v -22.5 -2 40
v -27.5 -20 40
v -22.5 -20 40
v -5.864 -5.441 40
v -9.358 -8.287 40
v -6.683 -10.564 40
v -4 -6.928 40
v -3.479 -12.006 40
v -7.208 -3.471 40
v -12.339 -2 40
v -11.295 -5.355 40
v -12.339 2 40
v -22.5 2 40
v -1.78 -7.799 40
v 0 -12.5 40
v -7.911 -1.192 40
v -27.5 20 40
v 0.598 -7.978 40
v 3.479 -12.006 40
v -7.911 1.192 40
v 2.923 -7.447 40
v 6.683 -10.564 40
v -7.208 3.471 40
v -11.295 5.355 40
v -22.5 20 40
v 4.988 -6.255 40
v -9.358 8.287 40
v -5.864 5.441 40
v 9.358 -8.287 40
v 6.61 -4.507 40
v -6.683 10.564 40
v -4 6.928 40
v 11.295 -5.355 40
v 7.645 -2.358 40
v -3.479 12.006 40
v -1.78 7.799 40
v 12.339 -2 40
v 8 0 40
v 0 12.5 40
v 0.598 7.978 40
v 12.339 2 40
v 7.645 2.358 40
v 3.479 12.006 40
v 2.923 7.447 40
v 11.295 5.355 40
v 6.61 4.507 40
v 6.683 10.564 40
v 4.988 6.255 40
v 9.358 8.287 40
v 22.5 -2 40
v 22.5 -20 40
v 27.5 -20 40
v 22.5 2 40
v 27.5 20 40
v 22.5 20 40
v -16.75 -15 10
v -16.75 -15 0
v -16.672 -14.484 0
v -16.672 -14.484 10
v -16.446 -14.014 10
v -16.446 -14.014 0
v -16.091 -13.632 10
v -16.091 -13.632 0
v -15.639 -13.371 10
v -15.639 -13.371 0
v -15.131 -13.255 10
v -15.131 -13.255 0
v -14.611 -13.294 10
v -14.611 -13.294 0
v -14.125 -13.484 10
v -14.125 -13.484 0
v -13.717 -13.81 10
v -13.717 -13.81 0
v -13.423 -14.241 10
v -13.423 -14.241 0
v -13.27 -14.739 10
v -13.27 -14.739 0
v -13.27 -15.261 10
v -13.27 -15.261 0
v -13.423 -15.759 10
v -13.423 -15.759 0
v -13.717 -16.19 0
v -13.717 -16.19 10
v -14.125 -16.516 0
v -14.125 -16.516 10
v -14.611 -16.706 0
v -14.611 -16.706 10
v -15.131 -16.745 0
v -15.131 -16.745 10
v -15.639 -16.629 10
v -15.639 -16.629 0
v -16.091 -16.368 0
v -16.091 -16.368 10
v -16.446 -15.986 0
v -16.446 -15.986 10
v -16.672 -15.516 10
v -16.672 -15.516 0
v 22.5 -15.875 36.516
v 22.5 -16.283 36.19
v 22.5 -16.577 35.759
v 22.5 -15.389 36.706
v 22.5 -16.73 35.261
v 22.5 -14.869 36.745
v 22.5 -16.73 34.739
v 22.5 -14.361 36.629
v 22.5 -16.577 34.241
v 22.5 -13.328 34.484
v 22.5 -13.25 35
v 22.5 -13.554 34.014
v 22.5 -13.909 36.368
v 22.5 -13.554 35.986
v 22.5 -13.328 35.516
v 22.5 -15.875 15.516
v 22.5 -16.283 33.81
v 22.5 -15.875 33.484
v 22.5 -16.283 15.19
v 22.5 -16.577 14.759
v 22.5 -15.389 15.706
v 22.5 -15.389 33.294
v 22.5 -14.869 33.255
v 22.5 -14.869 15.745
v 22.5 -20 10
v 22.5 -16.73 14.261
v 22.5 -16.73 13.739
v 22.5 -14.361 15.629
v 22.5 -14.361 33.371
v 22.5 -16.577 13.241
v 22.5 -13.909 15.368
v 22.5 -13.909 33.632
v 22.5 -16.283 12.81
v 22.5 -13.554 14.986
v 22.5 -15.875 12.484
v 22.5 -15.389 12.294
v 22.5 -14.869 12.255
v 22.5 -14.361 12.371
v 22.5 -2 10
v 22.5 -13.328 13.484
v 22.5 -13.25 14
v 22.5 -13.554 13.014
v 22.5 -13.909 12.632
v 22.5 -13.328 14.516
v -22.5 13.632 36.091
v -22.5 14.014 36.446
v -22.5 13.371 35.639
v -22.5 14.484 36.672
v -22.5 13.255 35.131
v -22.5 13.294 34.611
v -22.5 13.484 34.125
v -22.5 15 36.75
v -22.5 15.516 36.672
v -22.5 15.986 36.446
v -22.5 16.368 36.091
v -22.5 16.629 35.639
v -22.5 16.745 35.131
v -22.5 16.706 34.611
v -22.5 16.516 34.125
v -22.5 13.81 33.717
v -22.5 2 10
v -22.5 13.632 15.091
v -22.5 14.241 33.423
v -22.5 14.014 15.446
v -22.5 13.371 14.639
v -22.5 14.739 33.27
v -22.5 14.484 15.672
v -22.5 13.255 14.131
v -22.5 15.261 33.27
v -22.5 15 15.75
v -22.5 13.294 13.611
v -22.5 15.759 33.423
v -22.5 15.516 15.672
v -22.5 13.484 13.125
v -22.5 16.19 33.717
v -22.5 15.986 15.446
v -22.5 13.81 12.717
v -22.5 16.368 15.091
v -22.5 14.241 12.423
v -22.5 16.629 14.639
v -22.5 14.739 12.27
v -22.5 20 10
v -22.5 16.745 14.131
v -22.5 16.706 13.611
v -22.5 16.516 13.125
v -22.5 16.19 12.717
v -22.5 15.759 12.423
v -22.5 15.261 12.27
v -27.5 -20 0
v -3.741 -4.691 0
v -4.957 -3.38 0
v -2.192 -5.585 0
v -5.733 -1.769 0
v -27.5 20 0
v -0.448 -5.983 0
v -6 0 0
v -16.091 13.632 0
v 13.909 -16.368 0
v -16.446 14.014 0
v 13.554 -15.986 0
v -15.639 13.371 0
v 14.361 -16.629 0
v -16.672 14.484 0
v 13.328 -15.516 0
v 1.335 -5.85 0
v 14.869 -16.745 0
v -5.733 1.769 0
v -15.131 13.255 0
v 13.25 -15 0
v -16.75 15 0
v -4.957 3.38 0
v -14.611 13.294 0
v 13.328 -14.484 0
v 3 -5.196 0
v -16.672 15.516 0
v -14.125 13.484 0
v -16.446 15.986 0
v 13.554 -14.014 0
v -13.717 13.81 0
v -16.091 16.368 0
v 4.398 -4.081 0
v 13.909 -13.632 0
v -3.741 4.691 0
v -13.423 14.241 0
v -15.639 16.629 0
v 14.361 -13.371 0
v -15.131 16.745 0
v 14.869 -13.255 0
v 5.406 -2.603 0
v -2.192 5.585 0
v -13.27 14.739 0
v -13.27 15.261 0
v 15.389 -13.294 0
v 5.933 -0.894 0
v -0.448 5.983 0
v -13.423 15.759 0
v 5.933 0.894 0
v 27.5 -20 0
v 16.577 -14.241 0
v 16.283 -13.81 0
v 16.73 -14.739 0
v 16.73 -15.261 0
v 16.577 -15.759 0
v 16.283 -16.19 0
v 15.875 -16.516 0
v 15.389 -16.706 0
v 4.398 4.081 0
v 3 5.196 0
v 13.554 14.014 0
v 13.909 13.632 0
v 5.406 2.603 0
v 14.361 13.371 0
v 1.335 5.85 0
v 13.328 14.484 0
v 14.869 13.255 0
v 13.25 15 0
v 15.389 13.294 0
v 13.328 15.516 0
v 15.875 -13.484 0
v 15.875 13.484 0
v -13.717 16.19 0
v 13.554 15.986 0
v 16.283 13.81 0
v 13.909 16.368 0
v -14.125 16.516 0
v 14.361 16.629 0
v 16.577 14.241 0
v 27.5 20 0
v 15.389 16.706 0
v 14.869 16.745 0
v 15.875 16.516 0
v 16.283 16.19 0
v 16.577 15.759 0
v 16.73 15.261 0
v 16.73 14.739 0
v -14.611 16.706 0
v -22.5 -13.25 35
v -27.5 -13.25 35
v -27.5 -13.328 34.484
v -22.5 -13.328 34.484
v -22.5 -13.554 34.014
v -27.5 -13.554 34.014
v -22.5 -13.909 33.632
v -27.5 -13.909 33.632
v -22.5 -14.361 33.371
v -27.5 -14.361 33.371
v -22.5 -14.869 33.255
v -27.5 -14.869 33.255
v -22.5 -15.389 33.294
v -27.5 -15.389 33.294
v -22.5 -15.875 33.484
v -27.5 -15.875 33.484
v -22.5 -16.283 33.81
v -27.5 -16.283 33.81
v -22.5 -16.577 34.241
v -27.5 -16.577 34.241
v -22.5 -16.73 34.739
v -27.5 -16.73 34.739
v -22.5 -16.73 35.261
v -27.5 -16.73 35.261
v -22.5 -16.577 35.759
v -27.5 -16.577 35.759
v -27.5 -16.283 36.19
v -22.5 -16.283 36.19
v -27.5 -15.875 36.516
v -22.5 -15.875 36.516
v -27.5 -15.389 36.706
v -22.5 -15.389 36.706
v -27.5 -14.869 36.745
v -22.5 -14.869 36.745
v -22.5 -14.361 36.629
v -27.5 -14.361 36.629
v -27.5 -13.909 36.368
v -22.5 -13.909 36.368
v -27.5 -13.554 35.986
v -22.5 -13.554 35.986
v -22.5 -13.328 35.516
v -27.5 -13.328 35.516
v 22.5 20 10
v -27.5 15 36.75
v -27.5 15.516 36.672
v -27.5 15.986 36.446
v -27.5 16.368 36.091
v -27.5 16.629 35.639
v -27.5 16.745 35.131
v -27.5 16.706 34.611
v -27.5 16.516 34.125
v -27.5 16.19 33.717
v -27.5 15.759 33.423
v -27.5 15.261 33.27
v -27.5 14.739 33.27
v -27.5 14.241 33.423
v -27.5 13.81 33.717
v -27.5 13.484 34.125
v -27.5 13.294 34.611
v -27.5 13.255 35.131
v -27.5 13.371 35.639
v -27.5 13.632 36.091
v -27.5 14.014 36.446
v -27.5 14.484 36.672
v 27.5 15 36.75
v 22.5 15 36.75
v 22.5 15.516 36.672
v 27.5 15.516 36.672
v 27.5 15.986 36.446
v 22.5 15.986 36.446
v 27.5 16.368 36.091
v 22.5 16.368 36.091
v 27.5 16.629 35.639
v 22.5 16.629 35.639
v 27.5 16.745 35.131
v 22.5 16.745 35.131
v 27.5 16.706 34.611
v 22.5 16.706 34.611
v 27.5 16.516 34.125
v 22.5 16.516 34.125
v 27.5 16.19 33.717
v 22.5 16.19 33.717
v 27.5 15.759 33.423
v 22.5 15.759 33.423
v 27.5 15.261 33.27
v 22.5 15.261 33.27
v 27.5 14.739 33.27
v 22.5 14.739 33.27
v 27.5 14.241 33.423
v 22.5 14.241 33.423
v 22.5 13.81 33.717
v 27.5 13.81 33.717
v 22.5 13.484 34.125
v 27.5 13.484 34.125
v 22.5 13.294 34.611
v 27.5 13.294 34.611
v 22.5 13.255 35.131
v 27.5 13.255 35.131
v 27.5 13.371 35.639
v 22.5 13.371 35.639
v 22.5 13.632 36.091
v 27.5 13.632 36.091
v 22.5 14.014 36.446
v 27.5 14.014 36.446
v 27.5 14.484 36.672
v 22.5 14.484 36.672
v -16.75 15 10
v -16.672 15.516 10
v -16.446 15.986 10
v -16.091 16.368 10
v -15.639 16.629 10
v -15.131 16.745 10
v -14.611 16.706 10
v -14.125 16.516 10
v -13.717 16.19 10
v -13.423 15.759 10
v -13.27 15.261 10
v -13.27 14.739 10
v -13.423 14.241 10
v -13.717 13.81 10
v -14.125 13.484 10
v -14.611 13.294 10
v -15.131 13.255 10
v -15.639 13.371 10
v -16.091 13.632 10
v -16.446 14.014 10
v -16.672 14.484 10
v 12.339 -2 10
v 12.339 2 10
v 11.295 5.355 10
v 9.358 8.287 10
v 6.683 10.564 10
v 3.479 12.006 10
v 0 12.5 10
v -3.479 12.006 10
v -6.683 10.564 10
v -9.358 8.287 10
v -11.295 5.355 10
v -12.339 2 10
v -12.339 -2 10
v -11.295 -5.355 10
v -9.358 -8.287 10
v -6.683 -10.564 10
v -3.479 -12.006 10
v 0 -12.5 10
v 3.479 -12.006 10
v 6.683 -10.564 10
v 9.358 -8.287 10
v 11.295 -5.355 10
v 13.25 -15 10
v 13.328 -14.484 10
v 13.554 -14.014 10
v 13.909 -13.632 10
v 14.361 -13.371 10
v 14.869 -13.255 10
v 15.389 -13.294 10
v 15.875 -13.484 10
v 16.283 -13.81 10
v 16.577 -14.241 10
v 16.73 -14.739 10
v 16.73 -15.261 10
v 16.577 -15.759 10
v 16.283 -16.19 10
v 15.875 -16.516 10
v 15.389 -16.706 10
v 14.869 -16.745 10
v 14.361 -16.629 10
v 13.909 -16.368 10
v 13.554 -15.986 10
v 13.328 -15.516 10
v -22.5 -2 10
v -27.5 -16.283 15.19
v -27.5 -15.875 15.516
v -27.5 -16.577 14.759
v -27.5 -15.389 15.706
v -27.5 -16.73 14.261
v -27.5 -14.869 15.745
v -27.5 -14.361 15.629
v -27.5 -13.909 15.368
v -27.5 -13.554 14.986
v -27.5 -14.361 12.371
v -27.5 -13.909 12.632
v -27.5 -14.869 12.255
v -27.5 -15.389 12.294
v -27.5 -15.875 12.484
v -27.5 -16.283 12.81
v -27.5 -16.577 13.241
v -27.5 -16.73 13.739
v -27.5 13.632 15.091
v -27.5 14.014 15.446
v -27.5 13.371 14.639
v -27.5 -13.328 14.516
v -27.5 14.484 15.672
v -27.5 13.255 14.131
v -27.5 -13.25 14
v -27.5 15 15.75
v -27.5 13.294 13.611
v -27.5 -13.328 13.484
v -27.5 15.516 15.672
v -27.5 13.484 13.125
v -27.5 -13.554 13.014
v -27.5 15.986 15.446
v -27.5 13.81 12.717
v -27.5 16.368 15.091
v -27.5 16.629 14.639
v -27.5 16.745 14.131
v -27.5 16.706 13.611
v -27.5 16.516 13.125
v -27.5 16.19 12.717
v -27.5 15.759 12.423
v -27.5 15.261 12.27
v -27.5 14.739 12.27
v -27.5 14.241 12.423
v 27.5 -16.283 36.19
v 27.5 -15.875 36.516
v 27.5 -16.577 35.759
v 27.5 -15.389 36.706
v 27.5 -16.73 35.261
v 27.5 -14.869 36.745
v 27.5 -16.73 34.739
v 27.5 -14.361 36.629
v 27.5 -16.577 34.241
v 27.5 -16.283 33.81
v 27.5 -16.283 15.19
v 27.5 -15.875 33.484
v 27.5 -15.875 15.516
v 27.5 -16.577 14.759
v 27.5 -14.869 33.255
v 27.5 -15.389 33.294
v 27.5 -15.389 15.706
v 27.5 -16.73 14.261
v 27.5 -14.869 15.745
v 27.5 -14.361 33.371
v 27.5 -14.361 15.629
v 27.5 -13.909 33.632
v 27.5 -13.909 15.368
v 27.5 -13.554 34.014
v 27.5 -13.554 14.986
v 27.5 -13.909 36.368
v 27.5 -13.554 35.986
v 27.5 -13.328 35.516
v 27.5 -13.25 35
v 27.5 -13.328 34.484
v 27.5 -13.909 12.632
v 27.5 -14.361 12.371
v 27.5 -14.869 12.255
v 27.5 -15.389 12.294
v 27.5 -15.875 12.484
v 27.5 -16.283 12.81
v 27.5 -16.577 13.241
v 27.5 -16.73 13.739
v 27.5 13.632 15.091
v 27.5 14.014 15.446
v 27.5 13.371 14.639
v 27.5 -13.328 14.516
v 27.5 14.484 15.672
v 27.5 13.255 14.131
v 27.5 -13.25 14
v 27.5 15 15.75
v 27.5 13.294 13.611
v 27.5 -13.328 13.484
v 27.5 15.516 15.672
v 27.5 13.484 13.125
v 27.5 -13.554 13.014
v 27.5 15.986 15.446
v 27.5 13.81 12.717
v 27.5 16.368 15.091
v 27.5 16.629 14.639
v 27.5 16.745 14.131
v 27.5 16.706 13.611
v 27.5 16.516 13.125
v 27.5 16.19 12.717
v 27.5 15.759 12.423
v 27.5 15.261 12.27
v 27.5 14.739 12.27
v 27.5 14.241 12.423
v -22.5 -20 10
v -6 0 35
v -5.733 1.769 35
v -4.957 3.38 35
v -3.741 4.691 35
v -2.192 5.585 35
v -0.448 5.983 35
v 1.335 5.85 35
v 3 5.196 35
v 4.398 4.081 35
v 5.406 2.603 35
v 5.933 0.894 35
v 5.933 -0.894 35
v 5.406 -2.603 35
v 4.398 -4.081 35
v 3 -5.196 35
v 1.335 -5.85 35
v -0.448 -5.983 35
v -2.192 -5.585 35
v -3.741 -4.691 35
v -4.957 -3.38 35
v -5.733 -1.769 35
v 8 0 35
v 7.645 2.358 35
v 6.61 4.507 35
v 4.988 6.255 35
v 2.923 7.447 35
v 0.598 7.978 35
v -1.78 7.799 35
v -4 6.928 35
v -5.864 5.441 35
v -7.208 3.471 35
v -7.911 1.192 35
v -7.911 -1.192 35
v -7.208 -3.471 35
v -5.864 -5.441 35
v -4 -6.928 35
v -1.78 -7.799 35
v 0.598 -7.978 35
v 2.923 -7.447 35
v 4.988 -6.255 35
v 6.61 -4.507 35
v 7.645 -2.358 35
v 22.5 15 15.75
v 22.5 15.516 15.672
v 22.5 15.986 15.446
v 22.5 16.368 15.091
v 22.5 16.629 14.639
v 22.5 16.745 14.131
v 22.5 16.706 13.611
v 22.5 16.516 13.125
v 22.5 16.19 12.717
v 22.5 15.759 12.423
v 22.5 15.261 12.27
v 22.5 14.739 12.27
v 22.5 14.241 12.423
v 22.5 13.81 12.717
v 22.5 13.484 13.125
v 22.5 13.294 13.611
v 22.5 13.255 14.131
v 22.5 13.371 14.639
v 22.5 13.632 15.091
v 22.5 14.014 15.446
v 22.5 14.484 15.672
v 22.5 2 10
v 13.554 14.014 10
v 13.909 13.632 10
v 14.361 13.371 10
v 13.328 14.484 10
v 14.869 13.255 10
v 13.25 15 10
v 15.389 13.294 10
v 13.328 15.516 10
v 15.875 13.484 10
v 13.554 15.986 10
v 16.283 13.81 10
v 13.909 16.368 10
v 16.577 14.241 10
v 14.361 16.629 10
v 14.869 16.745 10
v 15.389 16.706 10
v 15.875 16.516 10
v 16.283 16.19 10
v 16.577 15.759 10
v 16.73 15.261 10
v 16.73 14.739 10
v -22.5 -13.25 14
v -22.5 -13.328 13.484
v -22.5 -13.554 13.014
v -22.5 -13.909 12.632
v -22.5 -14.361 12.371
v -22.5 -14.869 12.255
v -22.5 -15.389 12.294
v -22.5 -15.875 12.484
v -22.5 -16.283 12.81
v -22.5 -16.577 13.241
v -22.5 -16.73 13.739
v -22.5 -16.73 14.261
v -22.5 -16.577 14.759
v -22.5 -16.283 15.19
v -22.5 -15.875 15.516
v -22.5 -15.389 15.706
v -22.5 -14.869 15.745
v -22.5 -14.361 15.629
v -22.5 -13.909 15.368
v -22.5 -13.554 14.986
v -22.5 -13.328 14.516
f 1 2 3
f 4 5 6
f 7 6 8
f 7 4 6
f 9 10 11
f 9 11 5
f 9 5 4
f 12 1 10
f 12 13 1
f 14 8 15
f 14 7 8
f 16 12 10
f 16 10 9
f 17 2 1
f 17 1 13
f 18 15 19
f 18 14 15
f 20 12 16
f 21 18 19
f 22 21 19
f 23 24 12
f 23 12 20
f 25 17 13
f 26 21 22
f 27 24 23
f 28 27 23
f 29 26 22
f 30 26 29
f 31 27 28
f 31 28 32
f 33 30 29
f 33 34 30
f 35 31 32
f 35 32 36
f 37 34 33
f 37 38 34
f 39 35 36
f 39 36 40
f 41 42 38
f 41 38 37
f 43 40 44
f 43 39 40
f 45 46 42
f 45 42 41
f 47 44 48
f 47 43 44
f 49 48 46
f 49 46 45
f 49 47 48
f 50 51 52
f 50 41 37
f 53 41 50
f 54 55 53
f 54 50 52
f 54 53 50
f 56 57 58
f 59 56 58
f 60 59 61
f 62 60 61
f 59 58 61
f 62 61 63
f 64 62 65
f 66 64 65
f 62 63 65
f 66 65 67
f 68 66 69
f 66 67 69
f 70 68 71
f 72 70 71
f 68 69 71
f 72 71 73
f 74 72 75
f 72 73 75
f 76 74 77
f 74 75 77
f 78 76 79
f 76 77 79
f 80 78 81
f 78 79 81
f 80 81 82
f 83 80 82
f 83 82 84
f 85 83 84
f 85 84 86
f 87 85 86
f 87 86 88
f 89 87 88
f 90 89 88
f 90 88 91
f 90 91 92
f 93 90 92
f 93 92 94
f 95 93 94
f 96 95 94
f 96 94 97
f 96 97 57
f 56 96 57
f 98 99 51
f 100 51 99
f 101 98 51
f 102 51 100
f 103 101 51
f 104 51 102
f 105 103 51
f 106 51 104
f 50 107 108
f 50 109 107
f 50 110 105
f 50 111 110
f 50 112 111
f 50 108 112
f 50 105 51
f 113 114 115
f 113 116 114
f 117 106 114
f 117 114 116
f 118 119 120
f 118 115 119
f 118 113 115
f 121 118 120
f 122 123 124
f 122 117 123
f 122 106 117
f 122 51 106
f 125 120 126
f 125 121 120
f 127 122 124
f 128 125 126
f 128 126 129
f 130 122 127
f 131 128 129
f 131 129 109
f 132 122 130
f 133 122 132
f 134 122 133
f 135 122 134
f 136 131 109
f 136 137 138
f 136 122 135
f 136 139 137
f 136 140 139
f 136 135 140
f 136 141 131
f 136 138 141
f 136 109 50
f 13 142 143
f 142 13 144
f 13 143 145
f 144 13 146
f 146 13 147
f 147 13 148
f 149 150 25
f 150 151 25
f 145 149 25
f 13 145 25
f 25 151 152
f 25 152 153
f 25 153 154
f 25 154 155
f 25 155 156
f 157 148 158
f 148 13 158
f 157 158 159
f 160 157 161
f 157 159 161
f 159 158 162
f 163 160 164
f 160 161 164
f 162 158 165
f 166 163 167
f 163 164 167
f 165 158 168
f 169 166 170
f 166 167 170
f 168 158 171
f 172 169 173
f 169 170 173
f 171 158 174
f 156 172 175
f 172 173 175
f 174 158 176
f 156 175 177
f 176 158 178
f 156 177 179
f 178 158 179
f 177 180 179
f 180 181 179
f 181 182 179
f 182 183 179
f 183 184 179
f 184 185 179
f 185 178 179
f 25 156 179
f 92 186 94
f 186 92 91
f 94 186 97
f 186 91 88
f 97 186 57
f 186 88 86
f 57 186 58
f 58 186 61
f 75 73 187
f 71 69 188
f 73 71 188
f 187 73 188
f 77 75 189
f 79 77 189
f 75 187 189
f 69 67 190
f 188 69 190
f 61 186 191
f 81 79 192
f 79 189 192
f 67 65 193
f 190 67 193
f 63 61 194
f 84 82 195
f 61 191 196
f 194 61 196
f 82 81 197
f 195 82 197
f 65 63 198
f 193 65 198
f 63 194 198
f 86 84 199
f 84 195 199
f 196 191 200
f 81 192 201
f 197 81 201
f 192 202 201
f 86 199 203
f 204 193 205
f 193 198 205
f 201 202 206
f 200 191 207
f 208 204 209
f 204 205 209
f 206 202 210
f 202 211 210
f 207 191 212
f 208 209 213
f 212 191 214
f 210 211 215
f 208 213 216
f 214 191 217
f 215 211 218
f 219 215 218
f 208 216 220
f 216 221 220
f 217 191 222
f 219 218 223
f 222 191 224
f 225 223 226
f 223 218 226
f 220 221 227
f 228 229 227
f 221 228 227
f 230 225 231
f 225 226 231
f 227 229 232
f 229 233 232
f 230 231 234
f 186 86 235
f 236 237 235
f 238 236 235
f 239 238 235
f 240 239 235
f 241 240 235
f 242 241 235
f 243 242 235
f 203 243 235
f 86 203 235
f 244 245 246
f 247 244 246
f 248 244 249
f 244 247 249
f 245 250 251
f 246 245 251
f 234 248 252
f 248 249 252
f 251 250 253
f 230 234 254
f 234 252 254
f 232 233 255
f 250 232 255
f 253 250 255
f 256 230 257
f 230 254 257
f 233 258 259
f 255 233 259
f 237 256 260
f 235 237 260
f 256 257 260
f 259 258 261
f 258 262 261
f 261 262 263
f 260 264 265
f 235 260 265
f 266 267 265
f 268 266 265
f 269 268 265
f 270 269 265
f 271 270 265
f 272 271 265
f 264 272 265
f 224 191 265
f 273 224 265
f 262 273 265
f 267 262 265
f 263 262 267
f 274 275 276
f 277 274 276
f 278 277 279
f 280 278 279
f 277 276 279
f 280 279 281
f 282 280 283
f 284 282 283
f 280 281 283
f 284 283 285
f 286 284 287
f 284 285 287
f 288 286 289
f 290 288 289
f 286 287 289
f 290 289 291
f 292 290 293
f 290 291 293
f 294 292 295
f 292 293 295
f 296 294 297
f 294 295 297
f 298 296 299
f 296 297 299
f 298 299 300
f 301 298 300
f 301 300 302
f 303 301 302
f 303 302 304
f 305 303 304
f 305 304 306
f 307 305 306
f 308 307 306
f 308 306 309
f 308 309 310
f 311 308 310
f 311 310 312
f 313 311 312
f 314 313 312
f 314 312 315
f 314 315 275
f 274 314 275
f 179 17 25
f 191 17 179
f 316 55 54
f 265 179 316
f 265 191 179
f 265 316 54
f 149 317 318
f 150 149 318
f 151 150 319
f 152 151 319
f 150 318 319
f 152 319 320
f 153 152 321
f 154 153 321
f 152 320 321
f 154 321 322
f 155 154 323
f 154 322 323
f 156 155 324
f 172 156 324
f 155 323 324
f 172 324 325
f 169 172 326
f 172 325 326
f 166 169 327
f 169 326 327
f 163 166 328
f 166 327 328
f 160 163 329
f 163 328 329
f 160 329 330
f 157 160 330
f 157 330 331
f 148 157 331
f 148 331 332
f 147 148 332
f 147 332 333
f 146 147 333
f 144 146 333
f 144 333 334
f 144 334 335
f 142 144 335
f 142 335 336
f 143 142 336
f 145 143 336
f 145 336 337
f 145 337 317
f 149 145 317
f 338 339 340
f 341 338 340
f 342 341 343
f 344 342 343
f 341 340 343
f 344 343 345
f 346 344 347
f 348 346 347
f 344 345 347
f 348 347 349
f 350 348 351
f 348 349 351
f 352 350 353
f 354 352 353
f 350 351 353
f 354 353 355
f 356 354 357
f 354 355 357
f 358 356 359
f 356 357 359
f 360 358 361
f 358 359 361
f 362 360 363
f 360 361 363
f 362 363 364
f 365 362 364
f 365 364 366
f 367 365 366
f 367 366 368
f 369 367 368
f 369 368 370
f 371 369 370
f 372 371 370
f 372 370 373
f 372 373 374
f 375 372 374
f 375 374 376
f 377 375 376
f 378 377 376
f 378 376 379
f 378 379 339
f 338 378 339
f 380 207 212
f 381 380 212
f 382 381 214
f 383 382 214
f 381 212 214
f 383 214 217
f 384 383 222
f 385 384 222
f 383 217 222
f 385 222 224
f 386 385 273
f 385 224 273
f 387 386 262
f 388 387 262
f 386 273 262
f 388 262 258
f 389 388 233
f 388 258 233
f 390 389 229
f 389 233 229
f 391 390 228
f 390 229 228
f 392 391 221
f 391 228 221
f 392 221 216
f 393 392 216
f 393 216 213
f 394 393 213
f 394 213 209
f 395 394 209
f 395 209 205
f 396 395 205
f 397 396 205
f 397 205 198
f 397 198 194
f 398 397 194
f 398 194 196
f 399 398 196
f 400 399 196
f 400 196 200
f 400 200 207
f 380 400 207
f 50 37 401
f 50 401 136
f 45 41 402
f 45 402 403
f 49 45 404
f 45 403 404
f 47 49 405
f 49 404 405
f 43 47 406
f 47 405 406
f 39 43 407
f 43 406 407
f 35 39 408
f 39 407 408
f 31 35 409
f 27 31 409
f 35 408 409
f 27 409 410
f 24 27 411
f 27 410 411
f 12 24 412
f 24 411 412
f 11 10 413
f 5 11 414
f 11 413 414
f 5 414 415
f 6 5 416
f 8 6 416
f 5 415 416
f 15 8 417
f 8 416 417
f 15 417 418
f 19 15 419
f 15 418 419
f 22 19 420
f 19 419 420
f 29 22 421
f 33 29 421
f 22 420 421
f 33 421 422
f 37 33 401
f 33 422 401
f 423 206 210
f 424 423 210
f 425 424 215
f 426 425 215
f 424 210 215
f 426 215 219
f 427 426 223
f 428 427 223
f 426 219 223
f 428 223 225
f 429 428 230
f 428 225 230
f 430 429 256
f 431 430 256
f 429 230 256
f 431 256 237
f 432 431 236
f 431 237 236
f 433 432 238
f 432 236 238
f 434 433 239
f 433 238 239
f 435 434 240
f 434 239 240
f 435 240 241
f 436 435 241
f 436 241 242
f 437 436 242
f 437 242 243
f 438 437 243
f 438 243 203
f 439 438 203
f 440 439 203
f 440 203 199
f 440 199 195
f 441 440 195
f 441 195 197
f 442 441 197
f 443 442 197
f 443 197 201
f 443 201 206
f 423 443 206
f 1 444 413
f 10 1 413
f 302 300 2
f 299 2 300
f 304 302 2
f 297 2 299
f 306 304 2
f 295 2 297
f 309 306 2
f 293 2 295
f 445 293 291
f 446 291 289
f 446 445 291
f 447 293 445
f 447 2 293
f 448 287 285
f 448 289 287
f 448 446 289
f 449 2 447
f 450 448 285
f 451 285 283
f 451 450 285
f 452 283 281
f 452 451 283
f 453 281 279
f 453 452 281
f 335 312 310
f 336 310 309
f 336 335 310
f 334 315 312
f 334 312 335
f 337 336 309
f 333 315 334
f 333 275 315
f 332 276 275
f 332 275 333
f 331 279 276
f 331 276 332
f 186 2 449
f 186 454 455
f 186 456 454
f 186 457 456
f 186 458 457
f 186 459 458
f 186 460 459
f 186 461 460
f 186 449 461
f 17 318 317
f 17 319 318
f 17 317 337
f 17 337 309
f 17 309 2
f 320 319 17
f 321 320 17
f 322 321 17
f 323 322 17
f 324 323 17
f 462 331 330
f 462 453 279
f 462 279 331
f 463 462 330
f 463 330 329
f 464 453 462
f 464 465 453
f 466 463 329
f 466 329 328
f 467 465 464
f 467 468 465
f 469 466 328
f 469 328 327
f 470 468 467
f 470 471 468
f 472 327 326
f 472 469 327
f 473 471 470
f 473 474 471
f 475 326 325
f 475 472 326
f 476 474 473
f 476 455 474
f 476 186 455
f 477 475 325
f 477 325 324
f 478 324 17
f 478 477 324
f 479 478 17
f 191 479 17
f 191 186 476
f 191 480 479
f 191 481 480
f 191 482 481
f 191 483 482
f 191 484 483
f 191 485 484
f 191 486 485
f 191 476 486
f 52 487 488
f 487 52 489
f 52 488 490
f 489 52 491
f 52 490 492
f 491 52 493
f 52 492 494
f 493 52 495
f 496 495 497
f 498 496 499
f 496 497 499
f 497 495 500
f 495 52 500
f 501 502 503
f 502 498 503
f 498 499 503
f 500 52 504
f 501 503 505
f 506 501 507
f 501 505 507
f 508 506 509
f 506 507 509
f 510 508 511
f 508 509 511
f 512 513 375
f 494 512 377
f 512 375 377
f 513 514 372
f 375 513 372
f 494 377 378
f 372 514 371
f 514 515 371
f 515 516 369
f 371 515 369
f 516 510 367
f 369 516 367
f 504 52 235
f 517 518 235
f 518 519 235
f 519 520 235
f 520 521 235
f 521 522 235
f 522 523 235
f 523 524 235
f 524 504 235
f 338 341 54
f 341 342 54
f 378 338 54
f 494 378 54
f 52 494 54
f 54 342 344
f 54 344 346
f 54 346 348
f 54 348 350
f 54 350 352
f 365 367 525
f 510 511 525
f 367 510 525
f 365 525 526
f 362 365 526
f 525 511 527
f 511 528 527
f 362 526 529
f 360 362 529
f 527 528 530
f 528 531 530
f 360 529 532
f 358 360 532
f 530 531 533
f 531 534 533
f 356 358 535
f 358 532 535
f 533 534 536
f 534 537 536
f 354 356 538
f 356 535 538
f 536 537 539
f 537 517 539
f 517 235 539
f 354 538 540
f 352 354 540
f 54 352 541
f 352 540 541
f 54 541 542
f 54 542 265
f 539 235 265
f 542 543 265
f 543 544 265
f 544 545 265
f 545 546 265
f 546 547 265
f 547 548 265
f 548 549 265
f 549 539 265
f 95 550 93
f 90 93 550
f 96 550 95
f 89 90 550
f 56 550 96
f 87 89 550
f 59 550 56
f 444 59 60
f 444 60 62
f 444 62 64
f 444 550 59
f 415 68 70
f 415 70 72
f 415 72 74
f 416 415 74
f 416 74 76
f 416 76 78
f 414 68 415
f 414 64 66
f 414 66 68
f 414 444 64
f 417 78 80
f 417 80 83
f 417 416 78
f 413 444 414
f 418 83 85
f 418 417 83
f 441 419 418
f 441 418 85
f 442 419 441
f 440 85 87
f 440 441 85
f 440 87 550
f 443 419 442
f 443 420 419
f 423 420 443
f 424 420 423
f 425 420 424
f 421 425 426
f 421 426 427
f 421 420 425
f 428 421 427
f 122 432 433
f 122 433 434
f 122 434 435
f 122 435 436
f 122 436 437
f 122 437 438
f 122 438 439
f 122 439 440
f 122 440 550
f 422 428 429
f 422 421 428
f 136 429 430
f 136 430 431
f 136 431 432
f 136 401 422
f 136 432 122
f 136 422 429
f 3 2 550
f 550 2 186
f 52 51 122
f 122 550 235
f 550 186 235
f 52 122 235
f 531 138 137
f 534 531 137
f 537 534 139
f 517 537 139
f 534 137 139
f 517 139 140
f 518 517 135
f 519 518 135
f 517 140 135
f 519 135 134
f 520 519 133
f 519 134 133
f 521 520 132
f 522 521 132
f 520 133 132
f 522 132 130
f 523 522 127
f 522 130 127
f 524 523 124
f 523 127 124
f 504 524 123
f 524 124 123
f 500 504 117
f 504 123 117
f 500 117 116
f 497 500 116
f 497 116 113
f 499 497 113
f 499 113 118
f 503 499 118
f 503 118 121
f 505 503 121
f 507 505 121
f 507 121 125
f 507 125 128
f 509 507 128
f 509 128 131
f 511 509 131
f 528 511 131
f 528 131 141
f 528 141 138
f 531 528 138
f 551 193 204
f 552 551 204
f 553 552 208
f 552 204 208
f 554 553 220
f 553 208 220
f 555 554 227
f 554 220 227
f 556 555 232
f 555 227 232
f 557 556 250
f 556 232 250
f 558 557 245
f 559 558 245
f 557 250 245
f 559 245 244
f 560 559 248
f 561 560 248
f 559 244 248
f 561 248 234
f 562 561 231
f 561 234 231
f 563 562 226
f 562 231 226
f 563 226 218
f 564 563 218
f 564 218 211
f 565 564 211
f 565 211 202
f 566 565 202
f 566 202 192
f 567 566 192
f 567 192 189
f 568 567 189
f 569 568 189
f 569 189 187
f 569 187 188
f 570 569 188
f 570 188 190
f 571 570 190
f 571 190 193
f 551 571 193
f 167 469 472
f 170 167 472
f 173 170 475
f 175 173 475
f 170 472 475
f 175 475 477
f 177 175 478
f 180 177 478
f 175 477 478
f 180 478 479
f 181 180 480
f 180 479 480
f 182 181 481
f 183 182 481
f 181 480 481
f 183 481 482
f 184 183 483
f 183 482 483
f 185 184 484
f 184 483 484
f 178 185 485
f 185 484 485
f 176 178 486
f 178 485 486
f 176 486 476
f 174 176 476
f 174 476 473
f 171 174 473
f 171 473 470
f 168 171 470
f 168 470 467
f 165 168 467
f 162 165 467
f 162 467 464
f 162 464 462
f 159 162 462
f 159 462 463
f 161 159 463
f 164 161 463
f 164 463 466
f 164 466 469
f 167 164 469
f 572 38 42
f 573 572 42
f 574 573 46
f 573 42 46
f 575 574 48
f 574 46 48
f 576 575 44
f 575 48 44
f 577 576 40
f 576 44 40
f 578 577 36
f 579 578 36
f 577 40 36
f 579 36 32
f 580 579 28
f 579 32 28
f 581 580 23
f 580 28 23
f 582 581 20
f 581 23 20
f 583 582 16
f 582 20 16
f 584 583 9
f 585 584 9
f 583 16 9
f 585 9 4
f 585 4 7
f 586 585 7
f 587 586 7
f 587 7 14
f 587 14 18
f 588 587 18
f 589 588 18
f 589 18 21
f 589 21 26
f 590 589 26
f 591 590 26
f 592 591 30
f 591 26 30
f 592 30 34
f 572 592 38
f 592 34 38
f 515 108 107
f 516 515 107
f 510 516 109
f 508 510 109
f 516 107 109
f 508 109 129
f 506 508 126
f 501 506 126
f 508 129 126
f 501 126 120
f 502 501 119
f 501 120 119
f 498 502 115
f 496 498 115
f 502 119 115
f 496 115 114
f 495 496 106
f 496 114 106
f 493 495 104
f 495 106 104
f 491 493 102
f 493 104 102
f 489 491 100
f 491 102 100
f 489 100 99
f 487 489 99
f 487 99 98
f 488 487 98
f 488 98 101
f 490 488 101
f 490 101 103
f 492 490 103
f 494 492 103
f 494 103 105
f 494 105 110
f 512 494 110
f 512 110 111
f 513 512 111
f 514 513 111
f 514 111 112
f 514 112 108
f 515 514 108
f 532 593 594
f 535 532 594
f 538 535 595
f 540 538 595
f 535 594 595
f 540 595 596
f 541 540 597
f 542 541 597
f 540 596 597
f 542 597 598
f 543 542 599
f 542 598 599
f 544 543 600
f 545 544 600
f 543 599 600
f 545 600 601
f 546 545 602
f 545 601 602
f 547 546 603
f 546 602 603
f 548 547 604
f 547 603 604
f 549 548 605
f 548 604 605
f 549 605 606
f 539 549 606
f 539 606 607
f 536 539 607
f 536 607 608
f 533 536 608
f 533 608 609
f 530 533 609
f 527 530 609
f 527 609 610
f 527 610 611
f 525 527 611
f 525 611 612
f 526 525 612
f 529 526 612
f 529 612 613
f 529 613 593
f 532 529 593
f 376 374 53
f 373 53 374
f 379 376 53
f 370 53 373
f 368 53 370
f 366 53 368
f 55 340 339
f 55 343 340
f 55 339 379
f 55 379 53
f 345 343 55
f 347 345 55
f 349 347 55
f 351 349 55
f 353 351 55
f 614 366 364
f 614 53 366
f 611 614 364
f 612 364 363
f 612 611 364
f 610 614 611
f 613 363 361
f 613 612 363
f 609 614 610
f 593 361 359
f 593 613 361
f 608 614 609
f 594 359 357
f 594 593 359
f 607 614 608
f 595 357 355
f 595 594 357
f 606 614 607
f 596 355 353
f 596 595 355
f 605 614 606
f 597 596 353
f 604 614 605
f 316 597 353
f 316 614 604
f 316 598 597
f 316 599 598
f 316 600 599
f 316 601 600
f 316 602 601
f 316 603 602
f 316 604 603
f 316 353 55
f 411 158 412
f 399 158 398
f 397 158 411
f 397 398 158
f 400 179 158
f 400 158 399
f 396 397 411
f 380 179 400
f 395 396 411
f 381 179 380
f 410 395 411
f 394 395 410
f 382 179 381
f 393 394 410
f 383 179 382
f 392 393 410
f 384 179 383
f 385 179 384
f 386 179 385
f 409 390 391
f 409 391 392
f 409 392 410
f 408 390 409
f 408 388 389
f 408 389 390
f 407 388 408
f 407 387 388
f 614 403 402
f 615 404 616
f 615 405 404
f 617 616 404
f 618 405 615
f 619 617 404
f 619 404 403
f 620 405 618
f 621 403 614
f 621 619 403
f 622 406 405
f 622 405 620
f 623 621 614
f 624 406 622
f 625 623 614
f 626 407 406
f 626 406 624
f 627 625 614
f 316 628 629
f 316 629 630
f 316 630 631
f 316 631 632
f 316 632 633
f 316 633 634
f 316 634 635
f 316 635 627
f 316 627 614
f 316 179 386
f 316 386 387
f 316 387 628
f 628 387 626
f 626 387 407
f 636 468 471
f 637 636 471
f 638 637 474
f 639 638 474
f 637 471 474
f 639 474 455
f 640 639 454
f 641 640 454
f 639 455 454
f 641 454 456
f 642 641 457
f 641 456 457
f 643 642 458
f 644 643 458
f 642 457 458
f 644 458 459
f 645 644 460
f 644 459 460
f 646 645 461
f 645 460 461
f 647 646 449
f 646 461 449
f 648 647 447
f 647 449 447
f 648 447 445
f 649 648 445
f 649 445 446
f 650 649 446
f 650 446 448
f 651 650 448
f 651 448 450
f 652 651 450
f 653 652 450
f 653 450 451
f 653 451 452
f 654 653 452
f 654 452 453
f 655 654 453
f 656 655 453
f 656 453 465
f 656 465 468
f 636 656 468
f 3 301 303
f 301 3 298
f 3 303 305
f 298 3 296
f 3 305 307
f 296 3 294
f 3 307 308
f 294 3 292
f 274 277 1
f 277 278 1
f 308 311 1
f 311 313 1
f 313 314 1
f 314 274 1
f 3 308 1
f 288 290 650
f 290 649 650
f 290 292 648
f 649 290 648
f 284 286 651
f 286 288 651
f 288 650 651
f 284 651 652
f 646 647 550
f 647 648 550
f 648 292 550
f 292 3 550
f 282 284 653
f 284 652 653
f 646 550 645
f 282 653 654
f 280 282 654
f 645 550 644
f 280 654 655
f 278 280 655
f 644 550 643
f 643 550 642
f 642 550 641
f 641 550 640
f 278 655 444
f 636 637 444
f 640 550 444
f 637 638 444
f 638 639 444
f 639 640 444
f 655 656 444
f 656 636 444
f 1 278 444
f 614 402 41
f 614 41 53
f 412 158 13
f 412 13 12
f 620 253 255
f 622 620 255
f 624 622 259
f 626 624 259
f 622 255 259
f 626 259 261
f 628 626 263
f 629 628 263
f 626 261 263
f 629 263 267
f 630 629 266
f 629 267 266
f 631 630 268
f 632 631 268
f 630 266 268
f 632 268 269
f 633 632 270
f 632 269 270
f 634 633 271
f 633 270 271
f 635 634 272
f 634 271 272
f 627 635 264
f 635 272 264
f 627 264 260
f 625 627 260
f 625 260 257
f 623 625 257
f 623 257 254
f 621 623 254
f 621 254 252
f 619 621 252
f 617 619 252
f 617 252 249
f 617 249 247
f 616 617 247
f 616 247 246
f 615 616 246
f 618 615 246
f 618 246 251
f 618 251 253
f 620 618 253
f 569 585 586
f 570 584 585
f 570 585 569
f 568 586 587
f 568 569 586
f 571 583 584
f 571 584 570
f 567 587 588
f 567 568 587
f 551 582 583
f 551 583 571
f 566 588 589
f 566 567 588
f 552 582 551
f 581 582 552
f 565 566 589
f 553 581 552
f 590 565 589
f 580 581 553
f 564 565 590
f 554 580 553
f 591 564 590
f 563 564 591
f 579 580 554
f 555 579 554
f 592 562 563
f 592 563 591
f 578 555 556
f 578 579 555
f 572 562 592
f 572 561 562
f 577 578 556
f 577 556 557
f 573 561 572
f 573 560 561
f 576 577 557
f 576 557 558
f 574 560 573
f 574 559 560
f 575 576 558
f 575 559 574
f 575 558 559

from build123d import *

# Parameters (mm, degrees)
SKETCH1_W           = 45
SKETCH1_H           = 40
BOSS_EXTRUDE1_DEPTH = 10
SKETCH2_W           = 5
SKETCH2_H           = 40
BOSS_EXTRUDE2_DEPTH = 40
SKETCH3_R           = 12.5
BOSS_EXTRUDE3_DEPTH = 30
SKETCH4_R           = 6
CUT_EXTRUDE1_DEPTH  = 53.5
SKETCH5_R           = 8
CUT_EXTRUDE2_DEPTH  = 5
SKETCH6_R           = 1.75
CUT_EXTRUDE3_DEPTH  = 53.5
SKETCH7_W           = 11
SKETCH7_H           = 4
BOSS_EXTRUDE4_DEPTH = 30
SKETCH8_R           = 1.75
CUT_EXTRUDE4_DEPTH  = 71.887234394


with BuildPart() as part:
    # Sketch1 → Boss-Extrude1 (new body)
    with BuildSketch(Plane.XY):
        Rectangle(SKETCH1_W, SKETCH1_H)
    extrude(amount=BOSS_EXTRUDE1_DEPTH)

    # Sketch2 → Boss-Extrude2 (add)
    with BuildSketch(Plane.XY):
        with Locations((-25, 0)):
            Rectangle(SKETCH2_W, SKETCH2_H)
        with Locations((25, 0)):
            Rectangle(SKETCH2_W, SKETCH2_H)
    extrude(amount=BOSS_EXTRUDE2_DEPTH)

    # Sketch3 → Boss-Extrude3 (add)
    with BuildSketch(Plane.XY.offset(10)):
        Circle(SKETCH3_R)
    extrude(amount=BOSS_EXTRUDE3_DEPTH)

    # Sketch4 → Cut-Extrude1 (cut, through all)
    with BuildSketch(Plane(origin=(0, 0, 0), x_dir=(-1, 0, 0), z_dir=(0, 0, -1))):
        Circle(SKETCH4_R)
    extrude(amount=-CUT_EXTRUDE1_DEPTH, mode=Mode.SUBTRACT)

    # Sketch5 → Cut-Extrude2 (cut)
    with BuildSketch(Plane.XY.offset(40)):
        Circle(SKETCH5_R)
    extrude(amount=-CUT_EXTRUDE2_DEPTH, mode=Mode.SUBTRACT)

    # Sketch6 → Cut-Extrude3 (cut, through all)
    with BuildSketch(Plane(origin=(0, 0, 0), x_dir=(-1, 0, 0), z_dir=(0, 0, -1))):
        with Locations((-15, 15)):
            Circle(SKETCH6_R)
        with Locations((15, 15)):
            Circle(SKETCH6_R)
        with Locations((15, -15)):
            Circle(SKETCH6_R)
        with Locations((-15, -15)):
            Circle(SKETCH6_R)
    extrude(amount=-CUT_EXTRUDE3_DEPTH, mode=Mode.SUBTRACT)

    # Sketch7 → Boss-Extrude4 (add)
    with BuildSketch(Plane.XY.offset(10)):
        with Locations((-17, 0)):
            Rectangle(SKETCH7_W, SKETCH7_H)
        with Locations((17, 0)):
            Rectangle(SKETCH7_W, SKETCH7_H)
    extrude(amount=BOSS_EXTRUDE4_DEPTH)

    # Sketch8 → Cut-Extrude4 (cut, through all)
    with BuildSketch(Plane.ZY.offset(27.5)):
        with Locations((35, 15)):
            Circle(SKETCH8_R)
        with Locations(Location((35, -15, 0), (0, 0, 90))):
            Circle(SKETCH8_R)
        with Locations((14, 15)):
            Circle(SKETCH8_R)
        with Locations(Location((14, -15, 0), (0, 0, 90))):
            Circle(SKETCH8_R)
    extrude(amount=-CUT_EXTRUDE4_DEPTH, mode=Mode.SUBTRACT)


solid = part.part
